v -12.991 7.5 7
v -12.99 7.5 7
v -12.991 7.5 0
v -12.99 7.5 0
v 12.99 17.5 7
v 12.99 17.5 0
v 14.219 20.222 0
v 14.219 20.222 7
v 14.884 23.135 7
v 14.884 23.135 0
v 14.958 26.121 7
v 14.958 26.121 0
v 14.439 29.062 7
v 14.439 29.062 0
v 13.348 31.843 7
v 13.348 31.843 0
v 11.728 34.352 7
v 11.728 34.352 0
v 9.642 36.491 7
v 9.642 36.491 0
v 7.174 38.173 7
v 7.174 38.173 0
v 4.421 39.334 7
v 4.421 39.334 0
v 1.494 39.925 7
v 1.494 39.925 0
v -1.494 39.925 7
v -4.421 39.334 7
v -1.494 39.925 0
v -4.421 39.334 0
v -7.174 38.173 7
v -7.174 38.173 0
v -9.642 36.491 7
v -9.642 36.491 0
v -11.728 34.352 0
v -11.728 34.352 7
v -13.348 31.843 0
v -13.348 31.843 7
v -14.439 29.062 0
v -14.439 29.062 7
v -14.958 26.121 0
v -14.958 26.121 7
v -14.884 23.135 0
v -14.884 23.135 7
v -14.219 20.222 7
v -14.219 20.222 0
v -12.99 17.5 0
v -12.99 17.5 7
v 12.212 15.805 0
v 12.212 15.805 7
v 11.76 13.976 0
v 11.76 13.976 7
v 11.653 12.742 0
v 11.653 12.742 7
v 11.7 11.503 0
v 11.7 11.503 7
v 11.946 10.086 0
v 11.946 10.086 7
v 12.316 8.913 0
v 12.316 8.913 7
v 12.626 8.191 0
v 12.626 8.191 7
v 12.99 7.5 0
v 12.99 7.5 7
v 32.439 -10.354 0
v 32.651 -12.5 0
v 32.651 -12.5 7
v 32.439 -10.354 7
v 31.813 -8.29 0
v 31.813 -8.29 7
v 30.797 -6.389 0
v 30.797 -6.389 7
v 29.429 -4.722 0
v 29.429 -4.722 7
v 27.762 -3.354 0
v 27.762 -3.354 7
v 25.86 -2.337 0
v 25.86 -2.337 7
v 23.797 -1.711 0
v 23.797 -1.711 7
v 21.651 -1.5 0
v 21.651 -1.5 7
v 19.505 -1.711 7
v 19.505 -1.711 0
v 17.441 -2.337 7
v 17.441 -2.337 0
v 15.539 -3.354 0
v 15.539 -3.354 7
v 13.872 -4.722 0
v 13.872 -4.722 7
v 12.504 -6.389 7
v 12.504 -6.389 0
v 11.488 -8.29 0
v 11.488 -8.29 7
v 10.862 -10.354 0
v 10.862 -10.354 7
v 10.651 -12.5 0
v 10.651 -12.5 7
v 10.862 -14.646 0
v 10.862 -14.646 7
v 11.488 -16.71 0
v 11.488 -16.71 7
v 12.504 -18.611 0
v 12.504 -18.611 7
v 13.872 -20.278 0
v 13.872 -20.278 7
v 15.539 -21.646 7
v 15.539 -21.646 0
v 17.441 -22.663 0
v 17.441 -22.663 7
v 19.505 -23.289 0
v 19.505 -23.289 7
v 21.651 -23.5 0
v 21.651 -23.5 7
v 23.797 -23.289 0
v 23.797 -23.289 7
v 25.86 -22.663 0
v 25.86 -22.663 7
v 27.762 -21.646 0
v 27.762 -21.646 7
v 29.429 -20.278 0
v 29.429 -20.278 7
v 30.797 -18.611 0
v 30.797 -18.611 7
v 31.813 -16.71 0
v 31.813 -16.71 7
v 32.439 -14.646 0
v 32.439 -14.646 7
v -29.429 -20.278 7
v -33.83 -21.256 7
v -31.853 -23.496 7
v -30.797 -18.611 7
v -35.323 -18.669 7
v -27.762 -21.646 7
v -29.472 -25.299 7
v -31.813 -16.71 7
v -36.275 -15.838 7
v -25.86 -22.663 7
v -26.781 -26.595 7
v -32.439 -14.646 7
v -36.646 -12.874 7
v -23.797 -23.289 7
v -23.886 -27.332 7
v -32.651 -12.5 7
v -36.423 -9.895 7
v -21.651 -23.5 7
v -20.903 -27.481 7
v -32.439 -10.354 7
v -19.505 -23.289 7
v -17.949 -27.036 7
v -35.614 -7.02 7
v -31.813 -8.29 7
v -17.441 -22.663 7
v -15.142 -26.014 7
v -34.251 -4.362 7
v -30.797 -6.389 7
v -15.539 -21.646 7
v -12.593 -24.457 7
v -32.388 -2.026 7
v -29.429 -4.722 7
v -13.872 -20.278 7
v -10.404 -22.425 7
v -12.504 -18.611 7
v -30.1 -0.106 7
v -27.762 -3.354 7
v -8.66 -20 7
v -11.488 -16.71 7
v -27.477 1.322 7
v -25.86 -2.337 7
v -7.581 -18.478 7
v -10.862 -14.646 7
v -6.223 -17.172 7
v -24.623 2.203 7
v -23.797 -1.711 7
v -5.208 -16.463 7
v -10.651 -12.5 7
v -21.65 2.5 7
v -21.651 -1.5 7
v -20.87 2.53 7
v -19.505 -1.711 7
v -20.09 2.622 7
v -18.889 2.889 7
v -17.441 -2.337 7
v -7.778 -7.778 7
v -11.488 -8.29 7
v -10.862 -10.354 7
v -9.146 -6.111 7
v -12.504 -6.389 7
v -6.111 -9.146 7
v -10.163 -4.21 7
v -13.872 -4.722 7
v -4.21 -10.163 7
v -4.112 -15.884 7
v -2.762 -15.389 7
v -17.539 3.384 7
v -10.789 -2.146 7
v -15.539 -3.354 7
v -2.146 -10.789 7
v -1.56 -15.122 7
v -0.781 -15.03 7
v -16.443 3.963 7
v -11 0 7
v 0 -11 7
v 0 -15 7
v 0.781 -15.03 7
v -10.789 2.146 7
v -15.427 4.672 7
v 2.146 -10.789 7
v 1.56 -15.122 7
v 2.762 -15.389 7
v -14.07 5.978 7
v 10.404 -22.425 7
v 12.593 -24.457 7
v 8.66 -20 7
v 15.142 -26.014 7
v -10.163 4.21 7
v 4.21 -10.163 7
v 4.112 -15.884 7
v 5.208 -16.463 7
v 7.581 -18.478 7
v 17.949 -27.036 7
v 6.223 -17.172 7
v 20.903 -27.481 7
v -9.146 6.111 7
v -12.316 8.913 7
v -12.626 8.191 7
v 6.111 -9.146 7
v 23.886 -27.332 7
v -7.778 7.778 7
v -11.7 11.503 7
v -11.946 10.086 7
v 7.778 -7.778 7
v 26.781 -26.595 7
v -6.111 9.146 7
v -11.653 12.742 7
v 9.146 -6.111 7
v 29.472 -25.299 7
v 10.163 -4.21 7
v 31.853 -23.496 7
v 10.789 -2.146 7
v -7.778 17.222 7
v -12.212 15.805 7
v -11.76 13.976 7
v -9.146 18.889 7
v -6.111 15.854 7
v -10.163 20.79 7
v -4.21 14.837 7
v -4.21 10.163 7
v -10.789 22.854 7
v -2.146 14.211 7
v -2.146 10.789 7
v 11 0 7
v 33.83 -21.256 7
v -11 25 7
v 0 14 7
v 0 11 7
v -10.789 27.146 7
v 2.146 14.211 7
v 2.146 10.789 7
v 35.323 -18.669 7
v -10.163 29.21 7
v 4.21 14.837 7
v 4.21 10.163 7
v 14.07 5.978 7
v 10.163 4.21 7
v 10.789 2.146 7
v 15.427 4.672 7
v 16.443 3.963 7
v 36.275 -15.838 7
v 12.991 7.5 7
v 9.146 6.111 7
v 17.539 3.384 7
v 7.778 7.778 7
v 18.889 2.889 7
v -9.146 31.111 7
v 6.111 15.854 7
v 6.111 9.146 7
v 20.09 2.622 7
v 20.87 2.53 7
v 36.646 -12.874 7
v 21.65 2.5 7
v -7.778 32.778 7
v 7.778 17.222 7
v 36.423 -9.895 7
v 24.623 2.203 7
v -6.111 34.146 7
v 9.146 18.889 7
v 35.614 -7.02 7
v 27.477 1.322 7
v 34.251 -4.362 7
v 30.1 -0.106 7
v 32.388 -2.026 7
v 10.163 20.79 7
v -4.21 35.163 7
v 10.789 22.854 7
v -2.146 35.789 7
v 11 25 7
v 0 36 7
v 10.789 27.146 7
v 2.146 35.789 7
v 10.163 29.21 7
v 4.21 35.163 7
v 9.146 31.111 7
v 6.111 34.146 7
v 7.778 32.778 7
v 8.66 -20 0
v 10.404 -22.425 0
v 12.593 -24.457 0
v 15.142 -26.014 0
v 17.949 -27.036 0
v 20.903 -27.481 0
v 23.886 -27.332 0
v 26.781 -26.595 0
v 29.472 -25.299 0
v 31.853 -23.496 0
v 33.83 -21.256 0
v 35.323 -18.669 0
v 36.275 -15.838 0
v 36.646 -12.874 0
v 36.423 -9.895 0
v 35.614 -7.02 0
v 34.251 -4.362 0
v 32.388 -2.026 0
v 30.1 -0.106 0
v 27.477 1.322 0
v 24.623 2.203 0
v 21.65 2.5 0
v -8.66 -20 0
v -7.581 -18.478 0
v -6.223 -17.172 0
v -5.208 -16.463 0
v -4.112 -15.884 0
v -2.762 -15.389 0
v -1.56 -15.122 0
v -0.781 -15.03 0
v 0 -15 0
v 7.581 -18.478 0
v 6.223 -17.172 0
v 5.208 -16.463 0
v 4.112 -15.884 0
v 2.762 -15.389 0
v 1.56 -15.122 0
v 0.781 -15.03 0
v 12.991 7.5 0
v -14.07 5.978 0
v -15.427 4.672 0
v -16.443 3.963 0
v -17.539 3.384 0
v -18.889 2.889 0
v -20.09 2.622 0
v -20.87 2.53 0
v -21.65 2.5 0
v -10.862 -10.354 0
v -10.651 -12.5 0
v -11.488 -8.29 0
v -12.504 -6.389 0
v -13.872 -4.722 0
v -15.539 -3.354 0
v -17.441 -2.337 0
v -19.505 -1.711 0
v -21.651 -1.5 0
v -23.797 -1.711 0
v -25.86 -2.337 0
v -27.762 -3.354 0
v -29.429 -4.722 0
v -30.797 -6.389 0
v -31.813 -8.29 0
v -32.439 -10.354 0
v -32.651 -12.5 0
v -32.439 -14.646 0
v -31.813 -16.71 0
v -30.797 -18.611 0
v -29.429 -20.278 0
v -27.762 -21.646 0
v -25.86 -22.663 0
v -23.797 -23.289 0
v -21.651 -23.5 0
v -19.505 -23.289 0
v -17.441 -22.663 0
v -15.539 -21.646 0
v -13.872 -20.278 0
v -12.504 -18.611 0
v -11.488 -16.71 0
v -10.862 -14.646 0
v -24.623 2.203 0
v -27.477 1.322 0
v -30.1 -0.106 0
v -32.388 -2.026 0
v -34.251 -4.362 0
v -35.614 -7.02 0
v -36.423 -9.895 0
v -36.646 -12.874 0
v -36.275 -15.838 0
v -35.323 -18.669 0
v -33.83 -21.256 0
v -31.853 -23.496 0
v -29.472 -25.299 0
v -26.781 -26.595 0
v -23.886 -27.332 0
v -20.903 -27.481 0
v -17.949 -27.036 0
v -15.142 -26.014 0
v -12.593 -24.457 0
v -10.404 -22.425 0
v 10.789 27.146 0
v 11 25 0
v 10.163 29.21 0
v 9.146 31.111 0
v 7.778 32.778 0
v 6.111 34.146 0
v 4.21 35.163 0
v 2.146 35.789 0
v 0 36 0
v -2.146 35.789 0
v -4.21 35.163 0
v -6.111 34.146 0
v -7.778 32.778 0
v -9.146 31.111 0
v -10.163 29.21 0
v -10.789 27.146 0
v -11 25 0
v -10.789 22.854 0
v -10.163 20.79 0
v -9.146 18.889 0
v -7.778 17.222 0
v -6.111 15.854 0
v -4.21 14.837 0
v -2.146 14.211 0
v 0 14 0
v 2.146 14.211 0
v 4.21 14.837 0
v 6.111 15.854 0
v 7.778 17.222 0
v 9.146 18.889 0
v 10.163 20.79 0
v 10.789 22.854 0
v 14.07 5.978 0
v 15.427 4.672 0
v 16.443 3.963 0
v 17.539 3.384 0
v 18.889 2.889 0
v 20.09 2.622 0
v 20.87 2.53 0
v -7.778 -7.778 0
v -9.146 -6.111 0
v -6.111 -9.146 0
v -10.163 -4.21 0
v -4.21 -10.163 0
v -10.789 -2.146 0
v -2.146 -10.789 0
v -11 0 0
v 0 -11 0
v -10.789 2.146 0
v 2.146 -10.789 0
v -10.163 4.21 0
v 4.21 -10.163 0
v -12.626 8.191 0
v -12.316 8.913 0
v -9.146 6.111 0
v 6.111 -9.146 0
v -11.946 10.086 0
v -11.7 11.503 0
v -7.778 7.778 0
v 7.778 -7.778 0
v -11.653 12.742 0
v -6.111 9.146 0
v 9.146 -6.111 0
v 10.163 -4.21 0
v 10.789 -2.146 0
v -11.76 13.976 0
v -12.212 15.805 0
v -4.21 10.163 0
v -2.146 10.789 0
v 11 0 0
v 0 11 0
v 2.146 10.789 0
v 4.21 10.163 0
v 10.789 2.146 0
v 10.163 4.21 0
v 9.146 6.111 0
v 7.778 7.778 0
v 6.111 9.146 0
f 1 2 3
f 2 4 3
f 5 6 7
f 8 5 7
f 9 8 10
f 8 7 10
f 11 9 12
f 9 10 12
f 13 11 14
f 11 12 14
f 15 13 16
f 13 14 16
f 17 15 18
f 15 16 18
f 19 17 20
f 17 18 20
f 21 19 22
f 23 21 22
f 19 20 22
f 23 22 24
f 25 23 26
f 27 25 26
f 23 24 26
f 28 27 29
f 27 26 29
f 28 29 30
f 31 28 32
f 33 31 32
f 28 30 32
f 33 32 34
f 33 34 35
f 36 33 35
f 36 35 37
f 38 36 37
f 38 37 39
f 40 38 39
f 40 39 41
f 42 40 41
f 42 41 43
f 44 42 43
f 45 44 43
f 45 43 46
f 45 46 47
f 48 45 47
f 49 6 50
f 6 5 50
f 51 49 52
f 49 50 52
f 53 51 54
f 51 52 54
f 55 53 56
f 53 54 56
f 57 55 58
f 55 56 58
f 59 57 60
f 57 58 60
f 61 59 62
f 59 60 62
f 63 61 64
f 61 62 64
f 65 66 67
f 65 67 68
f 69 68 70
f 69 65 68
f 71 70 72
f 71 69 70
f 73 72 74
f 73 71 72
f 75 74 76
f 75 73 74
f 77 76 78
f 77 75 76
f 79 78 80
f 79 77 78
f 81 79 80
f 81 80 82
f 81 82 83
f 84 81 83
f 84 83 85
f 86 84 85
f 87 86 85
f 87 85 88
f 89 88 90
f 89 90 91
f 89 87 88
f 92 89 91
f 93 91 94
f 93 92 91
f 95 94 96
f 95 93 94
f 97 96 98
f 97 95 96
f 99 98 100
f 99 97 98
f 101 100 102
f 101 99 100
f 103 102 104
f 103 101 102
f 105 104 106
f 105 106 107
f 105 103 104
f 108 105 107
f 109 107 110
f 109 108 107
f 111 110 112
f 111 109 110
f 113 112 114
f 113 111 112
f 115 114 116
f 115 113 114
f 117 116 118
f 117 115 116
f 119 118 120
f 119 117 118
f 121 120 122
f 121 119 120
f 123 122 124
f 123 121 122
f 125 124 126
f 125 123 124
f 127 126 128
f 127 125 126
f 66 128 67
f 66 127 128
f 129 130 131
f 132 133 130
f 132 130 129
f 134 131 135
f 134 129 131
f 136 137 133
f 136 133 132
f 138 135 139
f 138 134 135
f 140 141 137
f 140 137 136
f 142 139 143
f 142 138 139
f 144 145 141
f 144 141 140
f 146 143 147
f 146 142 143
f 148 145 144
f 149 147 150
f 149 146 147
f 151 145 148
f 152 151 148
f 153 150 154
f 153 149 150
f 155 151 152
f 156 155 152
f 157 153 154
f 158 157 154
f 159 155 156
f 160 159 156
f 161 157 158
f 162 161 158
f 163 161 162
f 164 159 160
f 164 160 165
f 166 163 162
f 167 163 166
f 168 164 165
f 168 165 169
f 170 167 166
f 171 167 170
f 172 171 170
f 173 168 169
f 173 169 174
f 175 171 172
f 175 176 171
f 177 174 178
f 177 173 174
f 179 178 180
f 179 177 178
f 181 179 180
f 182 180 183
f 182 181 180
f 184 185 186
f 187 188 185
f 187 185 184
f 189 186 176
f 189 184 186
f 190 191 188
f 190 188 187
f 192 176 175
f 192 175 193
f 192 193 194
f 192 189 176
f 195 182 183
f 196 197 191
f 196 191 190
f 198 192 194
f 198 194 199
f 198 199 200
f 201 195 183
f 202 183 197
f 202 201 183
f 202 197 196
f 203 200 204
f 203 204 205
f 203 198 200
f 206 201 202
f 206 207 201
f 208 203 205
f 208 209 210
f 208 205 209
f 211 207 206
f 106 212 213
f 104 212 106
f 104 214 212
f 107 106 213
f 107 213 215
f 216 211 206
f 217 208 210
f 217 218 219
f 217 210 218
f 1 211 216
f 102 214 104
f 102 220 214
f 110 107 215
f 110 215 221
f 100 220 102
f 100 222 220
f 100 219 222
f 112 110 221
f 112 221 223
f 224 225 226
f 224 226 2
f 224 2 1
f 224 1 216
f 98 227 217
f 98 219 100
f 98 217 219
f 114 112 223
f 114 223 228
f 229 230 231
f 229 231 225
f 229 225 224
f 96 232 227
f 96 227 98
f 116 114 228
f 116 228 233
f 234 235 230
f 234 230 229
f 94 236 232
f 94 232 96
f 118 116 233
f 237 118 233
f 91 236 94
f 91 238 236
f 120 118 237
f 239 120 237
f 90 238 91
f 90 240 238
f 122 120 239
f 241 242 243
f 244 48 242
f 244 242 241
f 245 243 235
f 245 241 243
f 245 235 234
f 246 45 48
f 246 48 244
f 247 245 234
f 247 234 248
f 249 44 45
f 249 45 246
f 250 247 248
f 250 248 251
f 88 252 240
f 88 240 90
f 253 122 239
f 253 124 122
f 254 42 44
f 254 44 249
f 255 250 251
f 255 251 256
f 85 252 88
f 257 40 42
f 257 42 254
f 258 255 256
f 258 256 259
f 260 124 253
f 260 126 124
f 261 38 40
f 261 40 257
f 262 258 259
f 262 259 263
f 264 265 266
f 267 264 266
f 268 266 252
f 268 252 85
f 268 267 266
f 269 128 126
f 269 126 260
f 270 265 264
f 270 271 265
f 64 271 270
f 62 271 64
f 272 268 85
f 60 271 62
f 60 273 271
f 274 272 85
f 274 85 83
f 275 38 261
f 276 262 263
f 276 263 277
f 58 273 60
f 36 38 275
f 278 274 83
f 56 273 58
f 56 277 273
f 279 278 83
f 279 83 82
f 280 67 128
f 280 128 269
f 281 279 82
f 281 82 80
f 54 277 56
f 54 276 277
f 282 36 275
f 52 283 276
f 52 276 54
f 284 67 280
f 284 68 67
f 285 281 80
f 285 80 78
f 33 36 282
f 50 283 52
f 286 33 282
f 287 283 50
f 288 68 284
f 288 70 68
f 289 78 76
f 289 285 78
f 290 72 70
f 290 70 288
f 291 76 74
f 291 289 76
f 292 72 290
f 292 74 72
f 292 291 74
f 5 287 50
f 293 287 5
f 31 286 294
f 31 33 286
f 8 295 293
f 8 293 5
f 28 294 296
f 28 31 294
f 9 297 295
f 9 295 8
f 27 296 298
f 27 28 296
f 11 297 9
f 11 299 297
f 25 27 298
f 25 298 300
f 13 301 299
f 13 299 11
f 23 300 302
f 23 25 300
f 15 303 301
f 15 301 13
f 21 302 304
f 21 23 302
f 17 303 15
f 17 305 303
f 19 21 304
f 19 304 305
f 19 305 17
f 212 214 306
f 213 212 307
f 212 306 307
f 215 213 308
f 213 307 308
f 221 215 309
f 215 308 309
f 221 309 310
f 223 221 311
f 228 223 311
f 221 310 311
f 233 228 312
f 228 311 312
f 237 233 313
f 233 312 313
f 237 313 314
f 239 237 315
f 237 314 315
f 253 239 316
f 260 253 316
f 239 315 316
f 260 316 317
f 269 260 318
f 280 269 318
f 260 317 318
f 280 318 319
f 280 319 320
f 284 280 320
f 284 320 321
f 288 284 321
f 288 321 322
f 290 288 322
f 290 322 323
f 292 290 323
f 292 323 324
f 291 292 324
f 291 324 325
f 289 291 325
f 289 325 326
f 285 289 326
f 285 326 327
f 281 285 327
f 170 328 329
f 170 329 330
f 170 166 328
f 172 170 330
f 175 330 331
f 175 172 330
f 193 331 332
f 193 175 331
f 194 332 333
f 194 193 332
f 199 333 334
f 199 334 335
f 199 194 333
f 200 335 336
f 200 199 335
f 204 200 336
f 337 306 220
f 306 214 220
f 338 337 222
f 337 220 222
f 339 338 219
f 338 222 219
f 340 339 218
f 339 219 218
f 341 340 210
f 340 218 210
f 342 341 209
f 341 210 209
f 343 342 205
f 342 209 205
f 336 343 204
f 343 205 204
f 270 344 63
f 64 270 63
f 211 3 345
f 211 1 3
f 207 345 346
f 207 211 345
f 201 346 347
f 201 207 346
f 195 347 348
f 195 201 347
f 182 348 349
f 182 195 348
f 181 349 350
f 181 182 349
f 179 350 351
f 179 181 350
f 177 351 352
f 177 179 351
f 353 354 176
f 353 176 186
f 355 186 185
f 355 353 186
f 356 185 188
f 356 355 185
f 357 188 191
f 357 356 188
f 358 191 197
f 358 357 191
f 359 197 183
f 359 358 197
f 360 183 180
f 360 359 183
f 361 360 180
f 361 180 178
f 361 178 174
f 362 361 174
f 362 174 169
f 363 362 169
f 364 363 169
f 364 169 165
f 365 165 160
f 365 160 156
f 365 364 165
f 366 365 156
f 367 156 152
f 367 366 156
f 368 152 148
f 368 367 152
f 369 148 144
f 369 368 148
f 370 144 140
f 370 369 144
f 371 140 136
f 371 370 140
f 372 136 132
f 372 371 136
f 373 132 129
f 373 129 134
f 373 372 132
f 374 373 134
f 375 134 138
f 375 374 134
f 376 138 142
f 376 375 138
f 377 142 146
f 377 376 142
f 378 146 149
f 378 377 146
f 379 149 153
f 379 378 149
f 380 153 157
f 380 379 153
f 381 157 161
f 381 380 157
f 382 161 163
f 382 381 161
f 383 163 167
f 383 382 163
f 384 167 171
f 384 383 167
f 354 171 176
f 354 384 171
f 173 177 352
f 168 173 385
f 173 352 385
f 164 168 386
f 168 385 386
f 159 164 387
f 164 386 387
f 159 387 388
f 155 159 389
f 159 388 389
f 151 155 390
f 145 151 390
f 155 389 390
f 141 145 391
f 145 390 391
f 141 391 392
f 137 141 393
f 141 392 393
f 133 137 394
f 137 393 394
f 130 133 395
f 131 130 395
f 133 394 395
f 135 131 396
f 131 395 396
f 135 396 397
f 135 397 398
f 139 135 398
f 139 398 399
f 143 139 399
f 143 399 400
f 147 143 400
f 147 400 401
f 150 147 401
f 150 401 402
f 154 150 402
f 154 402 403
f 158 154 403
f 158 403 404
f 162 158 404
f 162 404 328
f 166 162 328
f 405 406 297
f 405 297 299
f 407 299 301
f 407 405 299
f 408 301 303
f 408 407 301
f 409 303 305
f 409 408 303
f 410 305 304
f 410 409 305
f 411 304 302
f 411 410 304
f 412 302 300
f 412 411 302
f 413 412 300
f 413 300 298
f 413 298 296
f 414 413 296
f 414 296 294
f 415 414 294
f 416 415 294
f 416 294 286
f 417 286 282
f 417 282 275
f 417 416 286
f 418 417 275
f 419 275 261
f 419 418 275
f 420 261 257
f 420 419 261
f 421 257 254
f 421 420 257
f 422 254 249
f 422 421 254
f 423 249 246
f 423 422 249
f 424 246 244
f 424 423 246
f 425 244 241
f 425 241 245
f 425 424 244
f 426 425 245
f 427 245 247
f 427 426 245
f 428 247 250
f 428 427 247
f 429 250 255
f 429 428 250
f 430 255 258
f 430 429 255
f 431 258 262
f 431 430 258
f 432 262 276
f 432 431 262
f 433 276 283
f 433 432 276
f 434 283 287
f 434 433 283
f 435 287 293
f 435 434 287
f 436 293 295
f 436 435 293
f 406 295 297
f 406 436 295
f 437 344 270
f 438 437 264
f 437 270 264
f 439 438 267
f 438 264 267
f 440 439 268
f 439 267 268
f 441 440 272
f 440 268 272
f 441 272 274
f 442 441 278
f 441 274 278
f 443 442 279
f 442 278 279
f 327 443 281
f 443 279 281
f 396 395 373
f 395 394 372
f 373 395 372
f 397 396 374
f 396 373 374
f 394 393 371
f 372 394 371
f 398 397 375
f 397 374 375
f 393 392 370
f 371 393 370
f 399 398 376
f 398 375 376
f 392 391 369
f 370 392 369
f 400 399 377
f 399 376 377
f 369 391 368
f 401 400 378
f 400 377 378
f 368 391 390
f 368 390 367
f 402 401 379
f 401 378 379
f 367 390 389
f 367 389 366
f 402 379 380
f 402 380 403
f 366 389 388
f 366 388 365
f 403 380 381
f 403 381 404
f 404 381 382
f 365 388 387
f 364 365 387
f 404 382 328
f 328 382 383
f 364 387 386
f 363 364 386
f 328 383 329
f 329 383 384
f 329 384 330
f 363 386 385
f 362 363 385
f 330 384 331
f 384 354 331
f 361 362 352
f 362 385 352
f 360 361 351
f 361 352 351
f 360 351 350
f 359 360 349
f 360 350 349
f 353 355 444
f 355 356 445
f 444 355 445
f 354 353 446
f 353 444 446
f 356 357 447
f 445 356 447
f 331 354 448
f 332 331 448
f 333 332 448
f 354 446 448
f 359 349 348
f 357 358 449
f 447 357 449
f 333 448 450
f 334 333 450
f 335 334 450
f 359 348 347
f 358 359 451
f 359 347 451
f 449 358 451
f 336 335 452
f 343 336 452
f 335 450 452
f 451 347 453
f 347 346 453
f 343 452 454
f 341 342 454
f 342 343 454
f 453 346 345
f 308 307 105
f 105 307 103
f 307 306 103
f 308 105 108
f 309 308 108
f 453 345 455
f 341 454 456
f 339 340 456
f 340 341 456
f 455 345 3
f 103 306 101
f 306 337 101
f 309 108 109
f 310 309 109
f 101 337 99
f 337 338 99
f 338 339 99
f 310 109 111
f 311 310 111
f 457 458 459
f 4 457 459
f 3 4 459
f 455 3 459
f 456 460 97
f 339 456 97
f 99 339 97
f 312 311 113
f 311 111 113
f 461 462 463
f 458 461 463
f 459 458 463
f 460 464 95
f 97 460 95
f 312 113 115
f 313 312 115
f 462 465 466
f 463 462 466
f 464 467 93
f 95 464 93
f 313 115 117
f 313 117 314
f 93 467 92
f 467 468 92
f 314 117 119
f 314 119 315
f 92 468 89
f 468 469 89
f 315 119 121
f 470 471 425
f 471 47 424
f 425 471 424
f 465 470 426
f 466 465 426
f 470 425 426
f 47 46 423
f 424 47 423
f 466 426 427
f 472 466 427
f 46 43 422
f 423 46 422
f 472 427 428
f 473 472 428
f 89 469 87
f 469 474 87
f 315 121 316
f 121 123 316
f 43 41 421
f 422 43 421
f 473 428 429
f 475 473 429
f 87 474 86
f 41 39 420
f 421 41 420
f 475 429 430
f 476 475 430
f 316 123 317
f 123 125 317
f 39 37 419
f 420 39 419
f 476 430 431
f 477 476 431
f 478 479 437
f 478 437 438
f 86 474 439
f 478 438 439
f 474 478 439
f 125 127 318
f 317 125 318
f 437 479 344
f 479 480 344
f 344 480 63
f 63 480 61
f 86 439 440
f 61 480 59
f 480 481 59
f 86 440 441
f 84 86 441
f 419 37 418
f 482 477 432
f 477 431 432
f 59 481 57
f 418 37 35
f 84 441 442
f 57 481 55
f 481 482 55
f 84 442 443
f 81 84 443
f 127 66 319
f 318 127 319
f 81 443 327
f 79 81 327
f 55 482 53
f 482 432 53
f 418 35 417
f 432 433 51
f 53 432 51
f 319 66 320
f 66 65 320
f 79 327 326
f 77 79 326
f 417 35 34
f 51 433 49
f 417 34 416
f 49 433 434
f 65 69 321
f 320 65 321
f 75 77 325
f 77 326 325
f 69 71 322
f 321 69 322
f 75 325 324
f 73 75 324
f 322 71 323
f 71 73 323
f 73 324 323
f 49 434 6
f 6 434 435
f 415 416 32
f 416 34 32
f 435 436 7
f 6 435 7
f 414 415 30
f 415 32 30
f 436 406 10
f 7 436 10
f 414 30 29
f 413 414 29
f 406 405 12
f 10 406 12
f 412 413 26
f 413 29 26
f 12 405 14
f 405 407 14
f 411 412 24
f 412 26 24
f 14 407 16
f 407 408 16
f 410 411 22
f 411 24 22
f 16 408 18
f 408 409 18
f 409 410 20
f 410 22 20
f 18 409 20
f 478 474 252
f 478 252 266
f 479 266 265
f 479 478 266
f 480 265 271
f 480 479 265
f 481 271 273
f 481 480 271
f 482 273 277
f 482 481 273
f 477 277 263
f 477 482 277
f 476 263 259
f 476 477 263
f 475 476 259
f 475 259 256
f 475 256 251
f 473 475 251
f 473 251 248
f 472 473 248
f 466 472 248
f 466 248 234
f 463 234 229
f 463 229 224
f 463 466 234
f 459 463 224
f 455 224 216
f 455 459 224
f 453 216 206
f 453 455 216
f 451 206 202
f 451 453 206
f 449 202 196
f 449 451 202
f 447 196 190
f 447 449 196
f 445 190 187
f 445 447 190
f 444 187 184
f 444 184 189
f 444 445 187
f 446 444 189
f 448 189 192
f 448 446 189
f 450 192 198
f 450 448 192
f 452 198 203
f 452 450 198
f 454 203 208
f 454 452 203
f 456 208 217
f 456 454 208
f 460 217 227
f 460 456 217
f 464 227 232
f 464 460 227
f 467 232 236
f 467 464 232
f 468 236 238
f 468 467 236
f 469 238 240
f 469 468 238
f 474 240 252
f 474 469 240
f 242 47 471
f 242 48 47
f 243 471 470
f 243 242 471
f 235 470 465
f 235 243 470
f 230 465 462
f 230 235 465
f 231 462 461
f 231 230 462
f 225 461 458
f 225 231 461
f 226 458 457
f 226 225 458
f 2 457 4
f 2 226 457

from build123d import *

# Parameters (mm, degrees)
F0_R     = 11
F1_DEPTH = 7
F2_R     = 9.999


# Not quite as in the source:
# - a fillet or chamfer is up to 0.001 mm smaller than in the source, because OpenCascade refuses the exact size


with BuildPart() as f1:
    # F0 (on Top) → F1 (new body)
    with BuildSketch(Plane.XY):
        with BuildLine():
            ThreePointArc((8.2915619759, 12.5), (0, 40), (-8.2915619759, 12.5))
            ThreePointArc((-8.2915619759, 12.5), (-12.9903810568, 7.5), (-14.9710985352, 0.9307033082))
            ThreePointArc((-14.9710985352, 0.9307033082), (-34.6410161514, -20), (-6.6795365594, -13.4307033082))
            ThreePointArc((-6.6795365594, -13.4307033082), (0, -15), (6.6795365594, -13.4307033082))
            ThreePointArc((6.6795365594, -13.4307033082), (34.6410161514, -20), (14.9710985352, 0.9307033082))
            ThreePointArc((14.9710985352, 0.9307033082), (12.9903810568, 7.5), (8.2915619759, 12.5))
        make_face()
        with Locations((-21.6506350946, -12.5)):
            Circle(F0_R, mode=Mode.SUBTRACT)
        with Locations((21.6506350946, -12.5)):
            Circle(F0_R, mode=Mode.SUBTRACT)
        Circle(F0_R, mode=Mode.SUBTRACT)
        with Locations((0, 25)):
            Circle(F0_R, mode=Mode.SUBTRACT)
    extrude(amount=F1_DEPTH)

    # F2 (radius 10 in the source; OpenCascade refuses exactly that, so slightly less here)
    f2_edges = [f1.edges().sort_by_distance(p)[0] for p in [
        (-8.291562, 12.5, 3.5),
        (-14.971099, 0.930703, 3.5),
        (-6.679537, -13.430703, 3.5),
        (6.679537, -13.430703, 3.5),
        (14.971099, 0.930703, 3.5),
        (8.291562, 12.5, 3.5),
    ]]
    fillet(f2_edges, radius=F2_R)


solid = f1.part
